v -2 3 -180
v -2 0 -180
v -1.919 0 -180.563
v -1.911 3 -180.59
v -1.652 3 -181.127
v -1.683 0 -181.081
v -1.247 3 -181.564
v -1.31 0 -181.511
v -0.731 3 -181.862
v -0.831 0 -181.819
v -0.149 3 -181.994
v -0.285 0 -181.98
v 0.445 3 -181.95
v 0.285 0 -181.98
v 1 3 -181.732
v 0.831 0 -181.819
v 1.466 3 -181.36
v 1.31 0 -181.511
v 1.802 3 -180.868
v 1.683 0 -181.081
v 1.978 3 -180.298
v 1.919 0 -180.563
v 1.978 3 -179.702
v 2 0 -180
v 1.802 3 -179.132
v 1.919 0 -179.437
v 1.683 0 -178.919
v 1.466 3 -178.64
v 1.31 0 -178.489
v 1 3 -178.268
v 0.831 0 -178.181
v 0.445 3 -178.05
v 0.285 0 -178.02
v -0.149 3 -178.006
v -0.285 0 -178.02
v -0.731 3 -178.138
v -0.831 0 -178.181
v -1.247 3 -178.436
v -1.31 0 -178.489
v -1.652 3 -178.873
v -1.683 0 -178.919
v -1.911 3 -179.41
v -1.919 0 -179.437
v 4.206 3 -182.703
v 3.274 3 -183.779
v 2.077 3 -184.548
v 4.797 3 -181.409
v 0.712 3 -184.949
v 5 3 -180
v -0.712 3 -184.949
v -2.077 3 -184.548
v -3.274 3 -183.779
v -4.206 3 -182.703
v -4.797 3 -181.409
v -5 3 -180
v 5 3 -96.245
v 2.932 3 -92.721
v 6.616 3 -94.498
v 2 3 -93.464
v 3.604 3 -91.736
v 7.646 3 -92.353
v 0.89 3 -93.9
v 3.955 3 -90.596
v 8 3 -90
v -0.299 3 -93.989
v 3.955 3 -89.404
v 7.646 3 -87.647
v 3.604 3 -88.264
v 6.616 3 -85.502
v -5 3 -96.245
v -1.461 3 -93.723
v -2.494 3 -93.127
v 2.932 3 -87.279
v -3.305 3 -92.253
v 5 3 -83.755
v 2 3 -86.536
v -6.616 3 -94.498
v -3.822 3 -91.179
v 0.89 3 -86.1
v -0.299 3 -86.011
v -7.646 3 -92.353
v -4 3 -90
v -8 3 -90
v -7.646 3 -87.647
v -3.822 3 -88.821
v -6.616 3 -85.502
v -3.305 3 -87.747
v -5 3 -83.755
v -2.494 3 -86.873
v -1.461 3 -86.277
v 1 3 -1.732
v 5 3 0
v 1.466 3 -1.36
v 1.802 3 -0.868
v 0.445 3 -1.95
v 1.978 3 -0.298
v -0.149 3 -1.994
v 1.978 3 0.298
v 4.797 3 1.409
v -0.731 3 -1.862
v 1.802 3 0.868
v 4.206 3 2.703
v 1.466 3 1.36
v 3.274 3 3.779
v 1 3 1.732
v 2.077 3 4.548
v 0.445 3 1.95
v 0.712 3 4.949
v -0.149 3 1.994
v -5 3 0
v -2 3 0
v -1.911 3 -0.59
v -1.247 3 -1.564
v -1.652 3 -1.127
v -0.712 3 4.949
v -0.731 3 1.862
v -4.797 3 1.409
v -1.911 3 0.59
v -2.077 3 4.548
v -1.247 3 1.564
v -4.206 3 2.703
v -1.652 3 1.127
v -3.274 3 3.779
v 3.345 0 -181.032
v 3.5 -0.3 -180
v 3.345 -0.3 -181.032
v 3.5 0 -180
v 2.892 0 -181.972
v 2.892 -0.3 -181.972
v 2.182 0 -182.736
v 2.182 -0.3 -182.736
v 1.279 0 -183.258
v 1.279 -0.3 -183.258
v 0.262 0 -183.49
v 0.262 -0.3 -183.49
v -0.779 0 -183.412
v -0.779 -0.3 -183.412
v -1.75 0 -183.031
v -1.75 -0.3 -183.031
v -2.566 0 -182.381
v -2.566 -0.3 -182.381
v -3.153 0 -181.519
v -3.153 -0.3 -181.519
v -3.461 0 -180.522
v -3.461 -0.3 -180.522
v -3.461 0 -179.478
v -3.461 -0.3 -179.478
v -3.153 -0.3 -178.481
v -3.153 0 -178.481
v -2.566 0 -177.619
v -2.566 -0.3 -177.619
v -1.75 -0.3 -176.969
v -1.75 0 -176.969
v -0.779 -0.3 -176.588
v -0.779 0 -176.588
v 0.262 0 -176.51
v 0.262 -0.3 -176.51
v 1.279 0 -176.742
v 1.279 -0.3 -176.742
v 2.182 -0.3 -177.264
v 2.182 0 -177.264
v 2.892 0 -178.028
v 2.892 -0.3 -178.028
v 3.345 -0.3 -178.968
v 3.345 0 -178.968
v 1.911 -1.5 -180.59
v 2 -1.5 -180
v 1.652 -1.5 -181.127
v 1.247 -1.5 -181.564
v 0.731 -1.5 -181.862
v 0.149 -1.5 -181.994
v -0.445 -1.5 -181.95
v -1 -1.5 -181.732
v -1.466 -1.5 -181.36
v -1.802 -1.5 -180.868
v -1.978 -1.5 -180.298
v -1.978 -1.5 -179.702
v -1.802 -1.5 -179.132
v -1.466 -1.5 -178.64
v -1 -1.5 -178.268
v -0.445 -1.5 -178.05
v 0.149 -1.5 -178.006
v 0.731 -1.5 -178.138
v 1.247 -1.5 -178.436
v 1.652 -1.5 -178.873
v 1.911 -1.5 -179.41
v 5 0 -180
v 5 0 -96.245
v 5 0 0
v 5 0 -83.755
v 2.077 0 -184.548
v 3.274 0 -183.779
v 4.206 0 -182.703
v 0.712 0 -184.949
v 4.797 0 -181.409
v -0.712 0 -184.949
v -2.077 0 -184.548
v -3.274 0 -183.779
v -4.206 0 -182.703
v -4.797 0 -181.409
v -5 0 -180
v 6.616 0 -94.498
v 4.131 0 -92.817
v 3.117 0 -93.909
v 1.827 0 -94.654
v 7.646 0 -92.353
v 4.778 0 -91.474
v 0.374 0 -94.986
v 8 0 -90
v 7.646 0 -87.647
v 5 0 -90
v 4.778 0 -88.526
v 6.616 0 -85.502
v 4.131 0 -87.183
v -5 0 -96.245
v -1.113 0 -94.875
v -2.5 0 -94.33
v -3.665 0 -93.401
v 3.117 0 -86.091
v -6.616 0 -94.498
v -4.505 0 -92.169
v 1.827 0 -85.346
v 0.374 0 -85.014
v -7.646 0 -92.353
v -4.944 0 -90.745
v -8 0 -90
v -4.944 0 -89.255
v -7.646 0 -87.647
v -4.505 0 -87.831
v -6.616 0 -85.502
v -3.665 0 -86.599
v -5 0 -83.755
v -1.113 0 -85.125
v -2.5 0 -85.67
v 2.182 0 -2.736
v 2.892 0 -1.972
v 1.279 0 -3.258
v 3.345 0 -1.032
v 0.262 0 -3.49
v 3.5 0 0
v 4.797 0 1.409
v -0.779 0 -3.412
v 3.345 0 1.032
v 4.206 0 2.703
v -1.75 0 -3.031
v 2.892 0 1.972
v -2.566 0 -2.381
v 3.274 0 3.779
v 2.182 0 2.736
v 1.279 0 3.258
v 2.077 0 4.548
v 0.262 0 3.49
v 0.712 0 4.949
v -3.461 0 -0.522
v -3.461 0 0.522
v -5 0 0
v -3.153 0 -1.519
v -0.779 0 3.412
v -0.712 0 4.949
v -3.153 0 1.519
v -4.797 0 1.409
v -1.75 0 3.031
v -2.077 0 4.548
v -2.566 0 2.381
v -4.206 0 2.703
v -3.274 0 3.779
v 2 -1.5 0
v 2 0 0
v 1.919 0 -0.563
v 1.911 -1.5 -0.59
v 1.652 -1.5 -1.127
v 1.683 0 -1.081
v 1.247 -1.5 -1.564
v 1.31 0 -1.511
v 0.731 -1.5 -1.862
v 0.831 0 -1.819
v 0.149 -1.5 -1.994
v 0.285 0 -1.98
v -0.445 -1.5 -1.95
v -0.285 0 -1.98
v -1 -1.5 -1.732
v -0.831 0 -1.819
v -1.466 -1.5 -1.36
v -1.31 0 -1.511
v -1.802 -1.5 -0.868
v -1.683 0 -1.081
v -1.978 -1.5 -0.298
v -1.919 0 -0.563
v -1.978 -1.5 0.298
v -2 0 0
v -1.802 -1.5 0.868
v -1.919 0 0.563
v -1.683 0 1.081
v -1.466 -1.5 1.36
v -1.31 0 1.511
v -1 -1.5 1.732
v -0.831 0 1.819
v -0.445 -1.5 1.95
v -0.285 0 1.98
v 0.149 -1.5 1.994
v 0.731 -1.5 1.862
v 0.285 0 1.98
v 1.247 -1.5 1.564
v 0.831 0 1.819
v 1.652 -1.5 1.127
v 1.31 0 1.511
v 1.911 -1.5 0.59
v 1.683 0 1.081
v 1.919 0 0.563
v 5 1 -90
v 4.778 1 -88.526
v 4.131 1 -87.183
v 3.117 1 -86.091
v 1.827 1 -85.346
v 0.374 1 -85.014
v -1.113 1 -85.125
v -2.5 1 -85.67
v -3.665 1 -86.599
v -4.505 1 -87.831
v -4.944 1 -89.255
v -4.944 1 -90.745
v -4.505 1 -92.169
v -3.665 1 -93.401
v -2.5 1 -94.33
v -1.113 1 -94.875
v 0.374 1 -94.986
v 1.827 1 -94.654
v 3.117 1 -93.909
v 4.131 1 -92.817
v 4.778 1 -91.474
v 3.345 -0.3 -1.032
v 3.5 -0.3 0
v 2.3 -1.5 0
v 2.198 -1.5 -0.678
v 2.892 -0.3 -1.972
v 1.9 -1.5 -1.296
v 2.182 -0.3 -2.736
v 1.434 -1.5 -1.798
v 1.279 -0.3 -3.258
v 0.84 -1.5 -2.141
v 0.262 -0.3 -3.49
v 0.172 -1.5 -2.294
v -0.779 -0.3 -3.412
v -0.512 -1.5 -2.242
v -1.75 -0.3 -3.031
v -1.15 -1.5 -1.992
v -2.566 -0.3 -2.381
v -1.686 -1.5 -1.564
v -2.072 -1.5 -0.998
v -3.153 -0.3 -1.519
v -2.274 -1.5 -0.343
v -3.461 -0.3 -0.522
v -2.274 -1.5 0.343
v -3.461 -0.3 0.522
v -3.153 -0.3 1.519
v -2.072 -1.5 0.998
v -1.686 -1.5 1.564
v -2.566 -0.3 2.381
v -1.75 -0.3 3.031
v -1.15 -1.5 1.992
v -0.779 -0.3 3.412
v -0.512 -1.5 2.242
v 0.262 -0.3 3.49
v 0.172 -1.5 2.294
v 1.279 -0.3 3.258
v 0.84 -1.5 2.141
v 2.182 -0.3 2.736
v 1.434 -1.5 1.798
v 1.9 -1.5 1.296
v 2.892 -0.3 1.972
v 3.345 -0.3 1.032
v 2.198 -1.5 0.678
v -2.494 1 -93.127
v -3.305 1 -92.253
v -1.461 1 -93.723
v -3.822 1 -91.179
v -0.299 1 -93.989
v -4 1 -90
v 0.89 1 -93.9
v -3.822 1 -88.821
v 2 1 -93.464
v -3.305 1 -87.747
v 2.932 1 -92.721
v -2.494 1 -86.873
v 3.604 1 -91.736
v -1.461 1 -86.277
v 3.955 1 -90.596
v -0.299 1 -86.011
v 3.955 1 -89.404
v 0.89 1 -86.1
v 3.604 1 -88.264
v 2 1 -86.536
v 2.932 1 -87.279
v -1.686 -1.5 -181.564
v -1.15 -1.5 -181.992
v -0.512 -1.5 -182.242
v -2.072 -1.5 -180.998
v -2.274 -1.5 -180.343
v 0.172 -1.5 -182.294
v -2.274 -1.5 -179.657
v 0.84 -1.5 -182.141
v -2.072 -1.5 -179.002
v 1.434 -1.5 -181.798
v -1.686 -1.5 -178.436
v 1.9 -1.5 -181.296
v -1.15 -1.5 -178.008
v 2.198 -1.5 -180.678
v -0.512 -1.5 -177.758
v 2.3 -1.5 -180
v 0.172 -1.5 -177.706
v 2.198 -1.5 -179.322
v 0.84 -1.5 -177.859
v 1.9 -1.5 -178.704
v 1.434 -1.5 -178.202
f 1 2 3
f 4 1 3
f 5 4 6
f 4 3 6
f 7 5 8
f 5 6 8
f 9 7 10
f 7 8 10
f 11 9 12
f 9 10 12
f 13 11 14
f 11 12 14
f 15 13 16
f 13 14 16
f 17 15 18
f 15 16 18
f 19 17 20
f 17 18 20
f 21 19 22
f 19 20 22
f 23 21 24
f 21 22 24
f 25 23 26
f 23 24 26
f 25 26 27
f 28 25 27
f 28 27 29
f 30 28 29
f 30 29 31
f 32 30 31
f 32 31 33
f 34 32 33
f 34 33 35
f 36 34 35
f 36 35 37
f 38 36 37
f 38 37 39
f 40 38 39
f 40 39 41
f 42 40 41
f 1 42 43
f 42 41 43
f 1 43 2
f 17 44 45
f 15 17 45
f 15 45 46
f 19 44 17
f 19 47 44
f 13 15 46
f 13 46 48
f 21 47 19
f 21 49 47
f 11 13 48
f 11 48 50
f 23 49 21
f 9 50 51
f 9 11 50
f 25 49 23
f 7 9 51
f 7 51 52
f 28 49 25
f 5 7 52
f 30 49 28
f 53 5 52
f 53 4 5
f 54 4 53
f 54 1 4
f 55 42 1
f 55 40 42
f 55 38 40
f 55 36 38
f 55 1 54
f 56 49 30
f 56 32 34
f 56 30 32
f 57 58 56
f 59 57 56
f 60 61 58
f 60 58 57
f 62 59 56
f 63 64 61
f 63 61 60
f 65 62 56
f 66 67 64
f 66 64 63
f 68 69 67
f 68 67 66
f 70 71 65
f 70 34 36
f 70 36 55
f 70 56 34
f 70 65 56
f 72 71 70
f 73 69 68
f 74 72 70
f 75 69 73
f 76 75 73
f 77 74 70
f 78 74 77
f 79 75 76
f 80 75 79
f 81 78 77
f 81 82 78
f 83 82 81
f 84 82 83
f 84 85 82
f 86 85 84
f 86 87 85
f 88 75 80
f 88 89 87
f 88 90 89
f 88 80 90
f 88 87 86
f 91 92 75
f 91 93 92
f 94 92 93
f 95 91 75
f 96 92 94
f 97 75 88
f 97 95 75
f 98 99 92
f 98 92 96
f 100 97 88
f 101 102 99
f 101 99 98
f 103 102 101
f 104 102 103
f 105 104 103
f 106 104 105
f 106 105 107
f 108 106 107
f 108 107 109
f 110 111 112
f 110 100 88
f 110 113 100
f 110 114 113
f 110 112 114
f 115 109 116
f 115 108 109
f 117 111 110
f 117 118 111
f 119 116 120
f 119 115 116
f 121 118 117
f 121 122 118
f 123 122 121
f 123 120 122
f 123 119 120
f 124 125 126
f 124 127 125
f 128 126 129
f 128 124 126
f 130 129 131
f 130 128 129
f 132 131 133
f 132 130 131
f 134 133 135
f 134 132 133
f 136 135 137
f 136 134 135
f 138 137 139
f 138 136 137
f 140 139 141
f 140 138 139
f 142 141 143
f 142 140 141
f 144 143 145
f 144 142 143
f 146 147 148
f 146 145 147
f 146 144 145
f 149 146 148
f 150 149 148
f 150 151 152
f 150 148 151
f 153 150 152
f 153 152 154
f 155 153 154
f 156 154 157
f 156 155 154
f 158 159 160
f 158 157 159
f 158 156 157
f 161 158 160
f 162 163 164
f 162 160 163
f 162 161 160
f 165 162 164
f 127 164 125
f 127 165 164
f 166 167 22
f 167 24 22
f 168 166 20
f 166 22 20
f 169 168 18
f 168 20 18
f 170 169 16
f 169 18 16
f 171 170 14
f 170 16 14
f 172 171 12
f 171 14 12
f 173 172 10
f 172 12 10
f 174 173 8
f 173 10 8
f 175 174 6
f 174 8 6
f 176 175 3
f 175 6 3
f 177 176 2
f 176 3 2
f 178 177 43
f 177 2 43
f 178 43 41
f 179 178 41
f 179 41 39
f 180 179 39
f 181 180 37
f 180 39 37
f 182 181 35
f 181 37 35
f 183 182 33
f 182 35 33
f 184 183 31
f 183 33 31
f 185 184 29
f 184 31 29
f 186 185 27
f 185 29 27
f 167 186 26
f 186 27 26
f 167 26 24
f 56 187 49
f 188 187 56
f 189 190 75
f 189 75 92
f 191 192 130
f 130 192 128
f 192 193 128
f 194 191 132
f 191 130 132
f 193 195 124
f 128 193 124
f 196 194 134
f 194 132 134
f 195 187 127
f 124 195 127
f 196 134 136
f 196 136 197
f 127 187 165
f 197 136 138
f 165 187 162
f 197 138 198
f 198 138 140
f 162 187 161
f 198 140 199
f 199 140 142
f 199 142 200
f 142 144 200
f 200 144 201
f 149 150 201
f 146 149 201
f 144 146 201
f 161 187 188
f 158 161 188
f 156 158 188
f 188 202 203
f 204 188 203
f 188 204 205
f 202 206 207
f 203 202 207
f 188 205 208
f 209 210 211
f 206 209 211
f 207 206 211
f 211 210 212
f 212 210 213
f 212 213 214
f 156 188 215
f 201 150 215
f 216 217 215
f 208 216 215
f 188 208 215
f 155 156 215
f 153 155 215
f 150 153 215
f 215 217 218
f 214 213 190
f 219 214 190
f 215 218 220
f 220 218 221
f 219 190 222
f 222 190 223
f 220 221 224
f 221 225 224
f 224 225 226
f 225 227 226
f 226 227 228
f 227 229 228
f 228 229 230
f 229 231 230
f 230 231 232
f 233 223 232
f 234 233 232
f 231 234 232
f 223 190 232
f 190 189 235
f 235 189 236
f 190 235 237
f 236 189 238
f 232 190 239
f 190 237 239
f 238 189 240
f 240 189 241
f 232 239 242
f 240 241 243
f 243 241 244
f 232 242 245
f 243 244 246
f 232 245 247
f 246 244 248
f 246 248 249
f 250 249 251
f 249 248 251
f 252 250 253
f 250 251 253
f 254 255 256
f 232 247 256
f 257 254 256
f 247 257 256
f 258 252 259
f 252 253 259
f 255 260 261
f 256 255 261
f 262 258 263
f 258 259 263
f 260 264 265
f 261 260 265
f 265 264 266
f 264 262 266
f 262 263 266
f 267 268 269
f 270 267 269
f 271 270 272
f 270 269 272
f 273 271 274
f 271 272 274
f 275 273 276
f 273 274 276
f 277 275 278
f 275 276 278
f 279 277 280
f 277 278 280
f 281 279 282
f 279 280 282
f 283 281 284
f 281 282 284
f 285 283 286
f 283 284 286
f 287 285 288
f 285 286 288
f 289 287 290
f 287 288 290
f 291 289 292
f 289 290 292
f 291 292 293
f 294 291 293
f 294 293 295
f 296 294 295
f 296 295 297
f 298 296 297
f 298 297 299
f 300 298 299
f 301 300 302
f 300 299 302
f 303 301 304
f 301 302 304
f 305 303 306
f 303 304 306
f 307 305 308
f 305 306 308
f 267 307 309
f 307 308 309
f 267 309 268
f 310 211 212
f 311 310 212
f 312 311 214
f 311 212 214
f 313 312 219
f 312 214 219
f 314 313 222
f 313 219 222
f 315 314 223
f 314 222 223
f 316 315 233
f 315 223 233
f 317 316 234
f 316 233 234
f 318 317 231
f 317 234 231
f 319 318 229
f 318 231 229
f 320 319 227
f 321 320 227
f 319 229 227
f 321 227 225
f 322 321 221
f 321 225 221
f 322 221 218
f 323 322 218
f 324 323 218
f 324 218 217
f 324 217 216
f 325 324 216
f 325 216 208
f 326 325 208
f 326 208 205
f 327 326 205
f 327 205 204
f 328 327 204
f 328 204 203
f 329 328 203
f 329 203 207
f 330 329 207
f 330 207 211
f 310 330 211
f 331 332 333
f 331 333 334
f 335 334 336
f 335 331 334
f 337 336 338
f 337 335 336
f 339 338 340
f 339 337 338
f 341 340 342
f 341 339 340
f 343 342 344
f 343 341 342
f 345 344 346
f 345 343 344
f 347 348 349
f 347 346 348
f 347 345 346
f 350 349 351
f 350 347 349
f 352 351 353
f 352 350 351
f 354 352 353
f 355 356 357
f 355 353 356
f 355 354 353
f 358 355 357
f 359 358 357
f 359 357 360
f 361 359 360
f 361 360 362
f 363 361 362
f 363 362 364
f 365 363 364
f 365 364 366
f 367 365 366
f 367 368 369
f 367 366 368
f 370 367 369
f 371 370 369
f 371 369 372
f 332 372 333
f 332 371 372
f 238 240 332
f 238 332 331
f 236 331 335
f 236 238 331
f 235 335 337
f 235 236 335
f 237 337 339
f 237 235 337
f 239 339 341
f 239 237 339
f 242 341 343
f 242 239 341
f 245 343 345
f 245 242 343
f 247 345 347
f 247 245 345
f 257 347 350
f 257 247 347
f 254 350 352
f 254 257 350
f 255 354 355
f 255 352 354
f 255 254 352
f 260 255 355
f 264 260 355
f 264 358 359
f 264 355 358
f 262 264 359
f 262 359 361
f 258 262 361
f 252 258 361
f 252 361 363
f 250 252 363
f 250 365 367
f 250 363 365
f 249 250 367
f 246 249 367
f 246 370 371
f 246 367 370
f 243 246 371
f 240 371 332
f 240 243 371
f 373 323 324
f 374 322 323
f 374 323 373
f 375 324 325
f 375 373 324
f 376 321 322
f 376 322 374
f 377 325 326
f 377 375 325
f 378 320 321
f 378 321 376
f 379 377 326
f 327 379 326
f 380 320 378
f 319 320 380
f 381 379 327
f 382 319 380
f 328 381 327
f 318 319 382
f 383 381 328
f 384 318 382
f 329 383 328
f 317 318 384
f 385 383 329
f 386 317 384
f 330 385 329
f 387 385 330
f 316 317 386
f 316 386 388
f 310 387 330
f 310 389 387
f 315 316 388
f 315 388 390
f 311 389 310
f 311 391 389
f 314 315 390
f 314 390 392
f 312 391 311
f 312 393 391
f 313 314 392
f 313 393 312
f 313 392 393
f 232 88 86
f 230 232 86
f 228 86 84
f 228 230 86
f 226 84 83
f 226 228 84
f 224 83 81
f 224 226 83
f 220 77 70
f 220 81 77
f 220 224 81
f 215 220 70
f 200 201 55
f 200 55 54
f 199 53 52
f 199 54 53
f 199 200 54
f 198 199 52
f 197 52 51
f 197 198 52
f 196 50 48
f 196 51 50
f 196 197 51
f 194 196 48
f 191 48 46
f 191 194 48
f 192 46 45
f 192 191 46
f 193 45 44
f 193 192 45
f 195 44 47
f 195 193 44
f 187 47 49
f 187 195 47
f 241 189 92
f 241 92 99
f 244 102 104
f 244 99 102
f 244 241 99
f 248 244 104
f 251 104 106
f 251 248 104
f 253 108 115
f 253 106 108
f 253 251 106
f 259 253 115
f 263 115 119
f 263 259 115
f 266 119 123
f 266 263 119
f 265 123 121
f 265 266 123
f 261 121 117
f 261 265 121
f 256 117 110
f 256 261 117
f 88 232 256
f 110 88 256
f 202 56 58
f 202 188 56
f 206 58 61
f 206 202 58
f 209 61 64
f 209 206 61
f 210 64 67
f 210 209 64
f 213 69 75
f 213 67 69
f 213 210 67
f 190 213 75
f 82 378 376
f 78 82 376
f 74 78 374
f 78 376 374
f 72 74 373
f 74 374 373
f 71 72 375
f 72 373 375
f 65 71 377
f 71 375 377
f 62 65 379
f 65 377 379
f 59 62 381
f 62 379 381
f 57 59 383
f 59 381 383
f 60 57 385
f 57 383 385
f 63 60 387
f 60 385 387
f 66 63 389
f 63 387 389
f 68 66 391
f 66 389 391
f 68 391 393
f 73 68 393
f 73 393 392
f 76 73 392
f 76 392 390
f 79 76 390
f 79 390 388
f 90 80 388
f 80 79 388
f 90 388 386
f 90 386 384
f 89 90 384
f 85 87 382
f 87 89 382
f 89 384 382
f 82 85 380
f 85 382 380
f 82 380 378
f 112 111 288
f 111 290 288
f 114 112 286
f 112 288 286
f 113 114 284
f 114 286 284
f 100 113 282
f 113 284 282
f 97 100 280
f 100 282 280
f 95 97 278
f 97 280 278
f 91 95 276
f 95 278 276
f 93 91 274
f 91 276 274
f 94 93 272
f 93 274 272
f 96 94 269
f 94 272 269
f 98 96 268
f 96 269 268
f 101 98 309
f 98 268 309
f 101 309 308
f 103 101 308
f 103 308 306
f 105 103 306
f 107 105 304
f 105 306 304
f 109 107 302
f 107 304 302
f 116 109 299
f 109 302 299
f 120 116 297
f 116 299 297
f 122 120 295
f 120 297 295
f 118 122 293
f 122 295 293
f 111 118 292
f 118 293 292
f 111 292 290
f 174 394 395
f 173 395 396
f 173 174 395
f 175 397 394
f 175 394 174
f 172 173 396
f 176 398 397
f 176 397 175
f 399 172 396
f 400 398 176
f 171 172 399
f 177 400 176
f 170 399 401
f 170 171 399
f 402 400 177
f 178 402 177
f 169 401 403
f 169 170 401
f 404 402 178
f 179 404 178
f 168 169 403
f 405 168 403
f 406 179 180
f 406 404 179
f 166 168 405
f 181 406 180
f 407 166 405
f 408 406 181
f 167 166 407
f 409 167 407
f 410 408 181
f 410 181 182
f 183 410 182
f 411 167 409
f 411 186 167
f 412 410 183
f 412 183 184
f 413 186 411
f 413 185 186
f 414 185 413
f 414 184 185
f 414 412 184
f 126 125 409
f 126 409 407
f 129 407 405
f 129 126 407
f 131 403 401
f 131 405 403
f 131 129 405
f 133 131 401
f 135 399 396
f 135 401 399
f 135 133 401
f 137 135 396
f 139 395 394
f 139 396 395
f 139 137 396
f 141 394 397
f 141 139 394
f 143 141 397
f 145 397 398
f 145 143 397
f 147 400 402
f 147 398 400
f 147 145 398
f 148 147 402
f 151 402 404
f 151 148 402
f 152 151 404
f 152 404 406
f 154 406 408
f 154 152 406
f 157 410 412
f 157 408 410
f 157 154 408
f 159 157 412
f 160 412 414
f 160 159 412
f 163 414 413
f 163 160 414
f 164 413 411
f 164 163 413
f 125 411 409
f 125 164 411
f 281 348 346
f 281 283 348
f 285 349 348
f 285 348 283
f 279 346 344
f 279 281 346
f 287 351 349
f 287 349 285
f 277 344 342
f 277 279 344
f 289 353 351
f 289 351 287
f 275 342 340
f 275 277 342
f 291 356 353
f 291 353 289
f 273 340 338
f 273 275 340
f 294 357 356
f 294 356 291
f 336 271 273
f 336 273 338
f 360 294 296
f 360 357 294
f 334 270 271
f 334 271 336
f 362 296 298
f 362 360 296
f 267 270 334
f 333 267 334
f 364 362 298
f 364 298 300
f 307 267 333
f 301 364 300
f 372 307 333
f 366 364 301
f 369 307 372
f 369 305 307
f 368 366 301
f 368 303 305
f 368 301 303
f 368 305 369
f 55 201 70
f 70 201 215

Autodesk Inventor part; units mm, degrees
ref_plane "YZ Plane" through (0, 0, 0) normal (1, 0, 0) x (0, 1, 0)
ref_plane "XZ Plane" through (0, 0, 0) normal (0, 1, 0) x (-1, 0, 0)
ref_plane "XY Plane" through (0, 0, 0) normal (0, 0, 1) x (1, 0, 0)
sketch "Эскиз1" plane through (0, 0, 0) normal (0, 1, 0) x (-1, 0, 0)
  circle A0 centre (0, 0) radius 2
  line L0 (0, 0) -> (0, -180) construction
  circle A1 centre (0, -180) radius 2
  arc A2 (5, 0) -> (-5, 0) centre (0, 0) ccw
  arc A3 (-5, -180) -> (5, -180) centre (0, -180) ccw
  line L1 (5, -180) -> (5, -96.245)
  line L2 (-5, -180) -> (-5, -96.245)
  line L3 (0, -90) -> (22.1641, -90) construction
  line L4 (5, -83.755) -> (5, 0)
  line L5 (-5, -83.755) -> (-5, 0)
  arc A4 (-5, -83.755) -> (-5, -96.245) centre (0, -90) ccw
  arc A5 (5, -96.245) -> (5, -83.755) centre (0, -90) ccw
  circle A6 centre (0, -90) radius 4
  dimension "d0" = 4
  dimension "d1" = 4
  dimension "d2" = 180
  dimension "d3" = 10
  dimension "d4" = 10
  dimension "d8" = 8
  dimension "d9" = 8
extrude "Выдавливание1" add sketch "Эскиз1" along normal blind 3
sketch "Эскиз2" plane through (0, 0, 0) normal (0, -1, 0) x (1, 0, 0)
  circle A0 centre (0, 0) radius 3.5
  circle A1 centre (0, -180) radius 2 projected
  circle A2 centre (0, -180) radius 3.5
  circle A3 centre (0, 0) radius 2 projected
  dimension "d10" = 7
  dimension "d11" = 7
extrude "Выдавливание2" add sketch "Эскиз2" along normal blind 1.5
chamfer "Фаска1" distance 1.2 angle 45 2 edges at (-3.5, -1.5, 0) (-3.5, -1.5, -180)
sketch "Эскиз3" plane through (0, 0, 0) normal (0, -1, 0) x (1, 0, 0)
  circle A0 centre (0, -90) radius 4 projected
  circle A1 centre (0, -90) radius 5
  point P0 (0, 0)
  dimension "d17" = 10
extrude "Выдавливание3" cut sketch "Эскиз3" against normal blind 1
properties part number "04-02-Тяга"
